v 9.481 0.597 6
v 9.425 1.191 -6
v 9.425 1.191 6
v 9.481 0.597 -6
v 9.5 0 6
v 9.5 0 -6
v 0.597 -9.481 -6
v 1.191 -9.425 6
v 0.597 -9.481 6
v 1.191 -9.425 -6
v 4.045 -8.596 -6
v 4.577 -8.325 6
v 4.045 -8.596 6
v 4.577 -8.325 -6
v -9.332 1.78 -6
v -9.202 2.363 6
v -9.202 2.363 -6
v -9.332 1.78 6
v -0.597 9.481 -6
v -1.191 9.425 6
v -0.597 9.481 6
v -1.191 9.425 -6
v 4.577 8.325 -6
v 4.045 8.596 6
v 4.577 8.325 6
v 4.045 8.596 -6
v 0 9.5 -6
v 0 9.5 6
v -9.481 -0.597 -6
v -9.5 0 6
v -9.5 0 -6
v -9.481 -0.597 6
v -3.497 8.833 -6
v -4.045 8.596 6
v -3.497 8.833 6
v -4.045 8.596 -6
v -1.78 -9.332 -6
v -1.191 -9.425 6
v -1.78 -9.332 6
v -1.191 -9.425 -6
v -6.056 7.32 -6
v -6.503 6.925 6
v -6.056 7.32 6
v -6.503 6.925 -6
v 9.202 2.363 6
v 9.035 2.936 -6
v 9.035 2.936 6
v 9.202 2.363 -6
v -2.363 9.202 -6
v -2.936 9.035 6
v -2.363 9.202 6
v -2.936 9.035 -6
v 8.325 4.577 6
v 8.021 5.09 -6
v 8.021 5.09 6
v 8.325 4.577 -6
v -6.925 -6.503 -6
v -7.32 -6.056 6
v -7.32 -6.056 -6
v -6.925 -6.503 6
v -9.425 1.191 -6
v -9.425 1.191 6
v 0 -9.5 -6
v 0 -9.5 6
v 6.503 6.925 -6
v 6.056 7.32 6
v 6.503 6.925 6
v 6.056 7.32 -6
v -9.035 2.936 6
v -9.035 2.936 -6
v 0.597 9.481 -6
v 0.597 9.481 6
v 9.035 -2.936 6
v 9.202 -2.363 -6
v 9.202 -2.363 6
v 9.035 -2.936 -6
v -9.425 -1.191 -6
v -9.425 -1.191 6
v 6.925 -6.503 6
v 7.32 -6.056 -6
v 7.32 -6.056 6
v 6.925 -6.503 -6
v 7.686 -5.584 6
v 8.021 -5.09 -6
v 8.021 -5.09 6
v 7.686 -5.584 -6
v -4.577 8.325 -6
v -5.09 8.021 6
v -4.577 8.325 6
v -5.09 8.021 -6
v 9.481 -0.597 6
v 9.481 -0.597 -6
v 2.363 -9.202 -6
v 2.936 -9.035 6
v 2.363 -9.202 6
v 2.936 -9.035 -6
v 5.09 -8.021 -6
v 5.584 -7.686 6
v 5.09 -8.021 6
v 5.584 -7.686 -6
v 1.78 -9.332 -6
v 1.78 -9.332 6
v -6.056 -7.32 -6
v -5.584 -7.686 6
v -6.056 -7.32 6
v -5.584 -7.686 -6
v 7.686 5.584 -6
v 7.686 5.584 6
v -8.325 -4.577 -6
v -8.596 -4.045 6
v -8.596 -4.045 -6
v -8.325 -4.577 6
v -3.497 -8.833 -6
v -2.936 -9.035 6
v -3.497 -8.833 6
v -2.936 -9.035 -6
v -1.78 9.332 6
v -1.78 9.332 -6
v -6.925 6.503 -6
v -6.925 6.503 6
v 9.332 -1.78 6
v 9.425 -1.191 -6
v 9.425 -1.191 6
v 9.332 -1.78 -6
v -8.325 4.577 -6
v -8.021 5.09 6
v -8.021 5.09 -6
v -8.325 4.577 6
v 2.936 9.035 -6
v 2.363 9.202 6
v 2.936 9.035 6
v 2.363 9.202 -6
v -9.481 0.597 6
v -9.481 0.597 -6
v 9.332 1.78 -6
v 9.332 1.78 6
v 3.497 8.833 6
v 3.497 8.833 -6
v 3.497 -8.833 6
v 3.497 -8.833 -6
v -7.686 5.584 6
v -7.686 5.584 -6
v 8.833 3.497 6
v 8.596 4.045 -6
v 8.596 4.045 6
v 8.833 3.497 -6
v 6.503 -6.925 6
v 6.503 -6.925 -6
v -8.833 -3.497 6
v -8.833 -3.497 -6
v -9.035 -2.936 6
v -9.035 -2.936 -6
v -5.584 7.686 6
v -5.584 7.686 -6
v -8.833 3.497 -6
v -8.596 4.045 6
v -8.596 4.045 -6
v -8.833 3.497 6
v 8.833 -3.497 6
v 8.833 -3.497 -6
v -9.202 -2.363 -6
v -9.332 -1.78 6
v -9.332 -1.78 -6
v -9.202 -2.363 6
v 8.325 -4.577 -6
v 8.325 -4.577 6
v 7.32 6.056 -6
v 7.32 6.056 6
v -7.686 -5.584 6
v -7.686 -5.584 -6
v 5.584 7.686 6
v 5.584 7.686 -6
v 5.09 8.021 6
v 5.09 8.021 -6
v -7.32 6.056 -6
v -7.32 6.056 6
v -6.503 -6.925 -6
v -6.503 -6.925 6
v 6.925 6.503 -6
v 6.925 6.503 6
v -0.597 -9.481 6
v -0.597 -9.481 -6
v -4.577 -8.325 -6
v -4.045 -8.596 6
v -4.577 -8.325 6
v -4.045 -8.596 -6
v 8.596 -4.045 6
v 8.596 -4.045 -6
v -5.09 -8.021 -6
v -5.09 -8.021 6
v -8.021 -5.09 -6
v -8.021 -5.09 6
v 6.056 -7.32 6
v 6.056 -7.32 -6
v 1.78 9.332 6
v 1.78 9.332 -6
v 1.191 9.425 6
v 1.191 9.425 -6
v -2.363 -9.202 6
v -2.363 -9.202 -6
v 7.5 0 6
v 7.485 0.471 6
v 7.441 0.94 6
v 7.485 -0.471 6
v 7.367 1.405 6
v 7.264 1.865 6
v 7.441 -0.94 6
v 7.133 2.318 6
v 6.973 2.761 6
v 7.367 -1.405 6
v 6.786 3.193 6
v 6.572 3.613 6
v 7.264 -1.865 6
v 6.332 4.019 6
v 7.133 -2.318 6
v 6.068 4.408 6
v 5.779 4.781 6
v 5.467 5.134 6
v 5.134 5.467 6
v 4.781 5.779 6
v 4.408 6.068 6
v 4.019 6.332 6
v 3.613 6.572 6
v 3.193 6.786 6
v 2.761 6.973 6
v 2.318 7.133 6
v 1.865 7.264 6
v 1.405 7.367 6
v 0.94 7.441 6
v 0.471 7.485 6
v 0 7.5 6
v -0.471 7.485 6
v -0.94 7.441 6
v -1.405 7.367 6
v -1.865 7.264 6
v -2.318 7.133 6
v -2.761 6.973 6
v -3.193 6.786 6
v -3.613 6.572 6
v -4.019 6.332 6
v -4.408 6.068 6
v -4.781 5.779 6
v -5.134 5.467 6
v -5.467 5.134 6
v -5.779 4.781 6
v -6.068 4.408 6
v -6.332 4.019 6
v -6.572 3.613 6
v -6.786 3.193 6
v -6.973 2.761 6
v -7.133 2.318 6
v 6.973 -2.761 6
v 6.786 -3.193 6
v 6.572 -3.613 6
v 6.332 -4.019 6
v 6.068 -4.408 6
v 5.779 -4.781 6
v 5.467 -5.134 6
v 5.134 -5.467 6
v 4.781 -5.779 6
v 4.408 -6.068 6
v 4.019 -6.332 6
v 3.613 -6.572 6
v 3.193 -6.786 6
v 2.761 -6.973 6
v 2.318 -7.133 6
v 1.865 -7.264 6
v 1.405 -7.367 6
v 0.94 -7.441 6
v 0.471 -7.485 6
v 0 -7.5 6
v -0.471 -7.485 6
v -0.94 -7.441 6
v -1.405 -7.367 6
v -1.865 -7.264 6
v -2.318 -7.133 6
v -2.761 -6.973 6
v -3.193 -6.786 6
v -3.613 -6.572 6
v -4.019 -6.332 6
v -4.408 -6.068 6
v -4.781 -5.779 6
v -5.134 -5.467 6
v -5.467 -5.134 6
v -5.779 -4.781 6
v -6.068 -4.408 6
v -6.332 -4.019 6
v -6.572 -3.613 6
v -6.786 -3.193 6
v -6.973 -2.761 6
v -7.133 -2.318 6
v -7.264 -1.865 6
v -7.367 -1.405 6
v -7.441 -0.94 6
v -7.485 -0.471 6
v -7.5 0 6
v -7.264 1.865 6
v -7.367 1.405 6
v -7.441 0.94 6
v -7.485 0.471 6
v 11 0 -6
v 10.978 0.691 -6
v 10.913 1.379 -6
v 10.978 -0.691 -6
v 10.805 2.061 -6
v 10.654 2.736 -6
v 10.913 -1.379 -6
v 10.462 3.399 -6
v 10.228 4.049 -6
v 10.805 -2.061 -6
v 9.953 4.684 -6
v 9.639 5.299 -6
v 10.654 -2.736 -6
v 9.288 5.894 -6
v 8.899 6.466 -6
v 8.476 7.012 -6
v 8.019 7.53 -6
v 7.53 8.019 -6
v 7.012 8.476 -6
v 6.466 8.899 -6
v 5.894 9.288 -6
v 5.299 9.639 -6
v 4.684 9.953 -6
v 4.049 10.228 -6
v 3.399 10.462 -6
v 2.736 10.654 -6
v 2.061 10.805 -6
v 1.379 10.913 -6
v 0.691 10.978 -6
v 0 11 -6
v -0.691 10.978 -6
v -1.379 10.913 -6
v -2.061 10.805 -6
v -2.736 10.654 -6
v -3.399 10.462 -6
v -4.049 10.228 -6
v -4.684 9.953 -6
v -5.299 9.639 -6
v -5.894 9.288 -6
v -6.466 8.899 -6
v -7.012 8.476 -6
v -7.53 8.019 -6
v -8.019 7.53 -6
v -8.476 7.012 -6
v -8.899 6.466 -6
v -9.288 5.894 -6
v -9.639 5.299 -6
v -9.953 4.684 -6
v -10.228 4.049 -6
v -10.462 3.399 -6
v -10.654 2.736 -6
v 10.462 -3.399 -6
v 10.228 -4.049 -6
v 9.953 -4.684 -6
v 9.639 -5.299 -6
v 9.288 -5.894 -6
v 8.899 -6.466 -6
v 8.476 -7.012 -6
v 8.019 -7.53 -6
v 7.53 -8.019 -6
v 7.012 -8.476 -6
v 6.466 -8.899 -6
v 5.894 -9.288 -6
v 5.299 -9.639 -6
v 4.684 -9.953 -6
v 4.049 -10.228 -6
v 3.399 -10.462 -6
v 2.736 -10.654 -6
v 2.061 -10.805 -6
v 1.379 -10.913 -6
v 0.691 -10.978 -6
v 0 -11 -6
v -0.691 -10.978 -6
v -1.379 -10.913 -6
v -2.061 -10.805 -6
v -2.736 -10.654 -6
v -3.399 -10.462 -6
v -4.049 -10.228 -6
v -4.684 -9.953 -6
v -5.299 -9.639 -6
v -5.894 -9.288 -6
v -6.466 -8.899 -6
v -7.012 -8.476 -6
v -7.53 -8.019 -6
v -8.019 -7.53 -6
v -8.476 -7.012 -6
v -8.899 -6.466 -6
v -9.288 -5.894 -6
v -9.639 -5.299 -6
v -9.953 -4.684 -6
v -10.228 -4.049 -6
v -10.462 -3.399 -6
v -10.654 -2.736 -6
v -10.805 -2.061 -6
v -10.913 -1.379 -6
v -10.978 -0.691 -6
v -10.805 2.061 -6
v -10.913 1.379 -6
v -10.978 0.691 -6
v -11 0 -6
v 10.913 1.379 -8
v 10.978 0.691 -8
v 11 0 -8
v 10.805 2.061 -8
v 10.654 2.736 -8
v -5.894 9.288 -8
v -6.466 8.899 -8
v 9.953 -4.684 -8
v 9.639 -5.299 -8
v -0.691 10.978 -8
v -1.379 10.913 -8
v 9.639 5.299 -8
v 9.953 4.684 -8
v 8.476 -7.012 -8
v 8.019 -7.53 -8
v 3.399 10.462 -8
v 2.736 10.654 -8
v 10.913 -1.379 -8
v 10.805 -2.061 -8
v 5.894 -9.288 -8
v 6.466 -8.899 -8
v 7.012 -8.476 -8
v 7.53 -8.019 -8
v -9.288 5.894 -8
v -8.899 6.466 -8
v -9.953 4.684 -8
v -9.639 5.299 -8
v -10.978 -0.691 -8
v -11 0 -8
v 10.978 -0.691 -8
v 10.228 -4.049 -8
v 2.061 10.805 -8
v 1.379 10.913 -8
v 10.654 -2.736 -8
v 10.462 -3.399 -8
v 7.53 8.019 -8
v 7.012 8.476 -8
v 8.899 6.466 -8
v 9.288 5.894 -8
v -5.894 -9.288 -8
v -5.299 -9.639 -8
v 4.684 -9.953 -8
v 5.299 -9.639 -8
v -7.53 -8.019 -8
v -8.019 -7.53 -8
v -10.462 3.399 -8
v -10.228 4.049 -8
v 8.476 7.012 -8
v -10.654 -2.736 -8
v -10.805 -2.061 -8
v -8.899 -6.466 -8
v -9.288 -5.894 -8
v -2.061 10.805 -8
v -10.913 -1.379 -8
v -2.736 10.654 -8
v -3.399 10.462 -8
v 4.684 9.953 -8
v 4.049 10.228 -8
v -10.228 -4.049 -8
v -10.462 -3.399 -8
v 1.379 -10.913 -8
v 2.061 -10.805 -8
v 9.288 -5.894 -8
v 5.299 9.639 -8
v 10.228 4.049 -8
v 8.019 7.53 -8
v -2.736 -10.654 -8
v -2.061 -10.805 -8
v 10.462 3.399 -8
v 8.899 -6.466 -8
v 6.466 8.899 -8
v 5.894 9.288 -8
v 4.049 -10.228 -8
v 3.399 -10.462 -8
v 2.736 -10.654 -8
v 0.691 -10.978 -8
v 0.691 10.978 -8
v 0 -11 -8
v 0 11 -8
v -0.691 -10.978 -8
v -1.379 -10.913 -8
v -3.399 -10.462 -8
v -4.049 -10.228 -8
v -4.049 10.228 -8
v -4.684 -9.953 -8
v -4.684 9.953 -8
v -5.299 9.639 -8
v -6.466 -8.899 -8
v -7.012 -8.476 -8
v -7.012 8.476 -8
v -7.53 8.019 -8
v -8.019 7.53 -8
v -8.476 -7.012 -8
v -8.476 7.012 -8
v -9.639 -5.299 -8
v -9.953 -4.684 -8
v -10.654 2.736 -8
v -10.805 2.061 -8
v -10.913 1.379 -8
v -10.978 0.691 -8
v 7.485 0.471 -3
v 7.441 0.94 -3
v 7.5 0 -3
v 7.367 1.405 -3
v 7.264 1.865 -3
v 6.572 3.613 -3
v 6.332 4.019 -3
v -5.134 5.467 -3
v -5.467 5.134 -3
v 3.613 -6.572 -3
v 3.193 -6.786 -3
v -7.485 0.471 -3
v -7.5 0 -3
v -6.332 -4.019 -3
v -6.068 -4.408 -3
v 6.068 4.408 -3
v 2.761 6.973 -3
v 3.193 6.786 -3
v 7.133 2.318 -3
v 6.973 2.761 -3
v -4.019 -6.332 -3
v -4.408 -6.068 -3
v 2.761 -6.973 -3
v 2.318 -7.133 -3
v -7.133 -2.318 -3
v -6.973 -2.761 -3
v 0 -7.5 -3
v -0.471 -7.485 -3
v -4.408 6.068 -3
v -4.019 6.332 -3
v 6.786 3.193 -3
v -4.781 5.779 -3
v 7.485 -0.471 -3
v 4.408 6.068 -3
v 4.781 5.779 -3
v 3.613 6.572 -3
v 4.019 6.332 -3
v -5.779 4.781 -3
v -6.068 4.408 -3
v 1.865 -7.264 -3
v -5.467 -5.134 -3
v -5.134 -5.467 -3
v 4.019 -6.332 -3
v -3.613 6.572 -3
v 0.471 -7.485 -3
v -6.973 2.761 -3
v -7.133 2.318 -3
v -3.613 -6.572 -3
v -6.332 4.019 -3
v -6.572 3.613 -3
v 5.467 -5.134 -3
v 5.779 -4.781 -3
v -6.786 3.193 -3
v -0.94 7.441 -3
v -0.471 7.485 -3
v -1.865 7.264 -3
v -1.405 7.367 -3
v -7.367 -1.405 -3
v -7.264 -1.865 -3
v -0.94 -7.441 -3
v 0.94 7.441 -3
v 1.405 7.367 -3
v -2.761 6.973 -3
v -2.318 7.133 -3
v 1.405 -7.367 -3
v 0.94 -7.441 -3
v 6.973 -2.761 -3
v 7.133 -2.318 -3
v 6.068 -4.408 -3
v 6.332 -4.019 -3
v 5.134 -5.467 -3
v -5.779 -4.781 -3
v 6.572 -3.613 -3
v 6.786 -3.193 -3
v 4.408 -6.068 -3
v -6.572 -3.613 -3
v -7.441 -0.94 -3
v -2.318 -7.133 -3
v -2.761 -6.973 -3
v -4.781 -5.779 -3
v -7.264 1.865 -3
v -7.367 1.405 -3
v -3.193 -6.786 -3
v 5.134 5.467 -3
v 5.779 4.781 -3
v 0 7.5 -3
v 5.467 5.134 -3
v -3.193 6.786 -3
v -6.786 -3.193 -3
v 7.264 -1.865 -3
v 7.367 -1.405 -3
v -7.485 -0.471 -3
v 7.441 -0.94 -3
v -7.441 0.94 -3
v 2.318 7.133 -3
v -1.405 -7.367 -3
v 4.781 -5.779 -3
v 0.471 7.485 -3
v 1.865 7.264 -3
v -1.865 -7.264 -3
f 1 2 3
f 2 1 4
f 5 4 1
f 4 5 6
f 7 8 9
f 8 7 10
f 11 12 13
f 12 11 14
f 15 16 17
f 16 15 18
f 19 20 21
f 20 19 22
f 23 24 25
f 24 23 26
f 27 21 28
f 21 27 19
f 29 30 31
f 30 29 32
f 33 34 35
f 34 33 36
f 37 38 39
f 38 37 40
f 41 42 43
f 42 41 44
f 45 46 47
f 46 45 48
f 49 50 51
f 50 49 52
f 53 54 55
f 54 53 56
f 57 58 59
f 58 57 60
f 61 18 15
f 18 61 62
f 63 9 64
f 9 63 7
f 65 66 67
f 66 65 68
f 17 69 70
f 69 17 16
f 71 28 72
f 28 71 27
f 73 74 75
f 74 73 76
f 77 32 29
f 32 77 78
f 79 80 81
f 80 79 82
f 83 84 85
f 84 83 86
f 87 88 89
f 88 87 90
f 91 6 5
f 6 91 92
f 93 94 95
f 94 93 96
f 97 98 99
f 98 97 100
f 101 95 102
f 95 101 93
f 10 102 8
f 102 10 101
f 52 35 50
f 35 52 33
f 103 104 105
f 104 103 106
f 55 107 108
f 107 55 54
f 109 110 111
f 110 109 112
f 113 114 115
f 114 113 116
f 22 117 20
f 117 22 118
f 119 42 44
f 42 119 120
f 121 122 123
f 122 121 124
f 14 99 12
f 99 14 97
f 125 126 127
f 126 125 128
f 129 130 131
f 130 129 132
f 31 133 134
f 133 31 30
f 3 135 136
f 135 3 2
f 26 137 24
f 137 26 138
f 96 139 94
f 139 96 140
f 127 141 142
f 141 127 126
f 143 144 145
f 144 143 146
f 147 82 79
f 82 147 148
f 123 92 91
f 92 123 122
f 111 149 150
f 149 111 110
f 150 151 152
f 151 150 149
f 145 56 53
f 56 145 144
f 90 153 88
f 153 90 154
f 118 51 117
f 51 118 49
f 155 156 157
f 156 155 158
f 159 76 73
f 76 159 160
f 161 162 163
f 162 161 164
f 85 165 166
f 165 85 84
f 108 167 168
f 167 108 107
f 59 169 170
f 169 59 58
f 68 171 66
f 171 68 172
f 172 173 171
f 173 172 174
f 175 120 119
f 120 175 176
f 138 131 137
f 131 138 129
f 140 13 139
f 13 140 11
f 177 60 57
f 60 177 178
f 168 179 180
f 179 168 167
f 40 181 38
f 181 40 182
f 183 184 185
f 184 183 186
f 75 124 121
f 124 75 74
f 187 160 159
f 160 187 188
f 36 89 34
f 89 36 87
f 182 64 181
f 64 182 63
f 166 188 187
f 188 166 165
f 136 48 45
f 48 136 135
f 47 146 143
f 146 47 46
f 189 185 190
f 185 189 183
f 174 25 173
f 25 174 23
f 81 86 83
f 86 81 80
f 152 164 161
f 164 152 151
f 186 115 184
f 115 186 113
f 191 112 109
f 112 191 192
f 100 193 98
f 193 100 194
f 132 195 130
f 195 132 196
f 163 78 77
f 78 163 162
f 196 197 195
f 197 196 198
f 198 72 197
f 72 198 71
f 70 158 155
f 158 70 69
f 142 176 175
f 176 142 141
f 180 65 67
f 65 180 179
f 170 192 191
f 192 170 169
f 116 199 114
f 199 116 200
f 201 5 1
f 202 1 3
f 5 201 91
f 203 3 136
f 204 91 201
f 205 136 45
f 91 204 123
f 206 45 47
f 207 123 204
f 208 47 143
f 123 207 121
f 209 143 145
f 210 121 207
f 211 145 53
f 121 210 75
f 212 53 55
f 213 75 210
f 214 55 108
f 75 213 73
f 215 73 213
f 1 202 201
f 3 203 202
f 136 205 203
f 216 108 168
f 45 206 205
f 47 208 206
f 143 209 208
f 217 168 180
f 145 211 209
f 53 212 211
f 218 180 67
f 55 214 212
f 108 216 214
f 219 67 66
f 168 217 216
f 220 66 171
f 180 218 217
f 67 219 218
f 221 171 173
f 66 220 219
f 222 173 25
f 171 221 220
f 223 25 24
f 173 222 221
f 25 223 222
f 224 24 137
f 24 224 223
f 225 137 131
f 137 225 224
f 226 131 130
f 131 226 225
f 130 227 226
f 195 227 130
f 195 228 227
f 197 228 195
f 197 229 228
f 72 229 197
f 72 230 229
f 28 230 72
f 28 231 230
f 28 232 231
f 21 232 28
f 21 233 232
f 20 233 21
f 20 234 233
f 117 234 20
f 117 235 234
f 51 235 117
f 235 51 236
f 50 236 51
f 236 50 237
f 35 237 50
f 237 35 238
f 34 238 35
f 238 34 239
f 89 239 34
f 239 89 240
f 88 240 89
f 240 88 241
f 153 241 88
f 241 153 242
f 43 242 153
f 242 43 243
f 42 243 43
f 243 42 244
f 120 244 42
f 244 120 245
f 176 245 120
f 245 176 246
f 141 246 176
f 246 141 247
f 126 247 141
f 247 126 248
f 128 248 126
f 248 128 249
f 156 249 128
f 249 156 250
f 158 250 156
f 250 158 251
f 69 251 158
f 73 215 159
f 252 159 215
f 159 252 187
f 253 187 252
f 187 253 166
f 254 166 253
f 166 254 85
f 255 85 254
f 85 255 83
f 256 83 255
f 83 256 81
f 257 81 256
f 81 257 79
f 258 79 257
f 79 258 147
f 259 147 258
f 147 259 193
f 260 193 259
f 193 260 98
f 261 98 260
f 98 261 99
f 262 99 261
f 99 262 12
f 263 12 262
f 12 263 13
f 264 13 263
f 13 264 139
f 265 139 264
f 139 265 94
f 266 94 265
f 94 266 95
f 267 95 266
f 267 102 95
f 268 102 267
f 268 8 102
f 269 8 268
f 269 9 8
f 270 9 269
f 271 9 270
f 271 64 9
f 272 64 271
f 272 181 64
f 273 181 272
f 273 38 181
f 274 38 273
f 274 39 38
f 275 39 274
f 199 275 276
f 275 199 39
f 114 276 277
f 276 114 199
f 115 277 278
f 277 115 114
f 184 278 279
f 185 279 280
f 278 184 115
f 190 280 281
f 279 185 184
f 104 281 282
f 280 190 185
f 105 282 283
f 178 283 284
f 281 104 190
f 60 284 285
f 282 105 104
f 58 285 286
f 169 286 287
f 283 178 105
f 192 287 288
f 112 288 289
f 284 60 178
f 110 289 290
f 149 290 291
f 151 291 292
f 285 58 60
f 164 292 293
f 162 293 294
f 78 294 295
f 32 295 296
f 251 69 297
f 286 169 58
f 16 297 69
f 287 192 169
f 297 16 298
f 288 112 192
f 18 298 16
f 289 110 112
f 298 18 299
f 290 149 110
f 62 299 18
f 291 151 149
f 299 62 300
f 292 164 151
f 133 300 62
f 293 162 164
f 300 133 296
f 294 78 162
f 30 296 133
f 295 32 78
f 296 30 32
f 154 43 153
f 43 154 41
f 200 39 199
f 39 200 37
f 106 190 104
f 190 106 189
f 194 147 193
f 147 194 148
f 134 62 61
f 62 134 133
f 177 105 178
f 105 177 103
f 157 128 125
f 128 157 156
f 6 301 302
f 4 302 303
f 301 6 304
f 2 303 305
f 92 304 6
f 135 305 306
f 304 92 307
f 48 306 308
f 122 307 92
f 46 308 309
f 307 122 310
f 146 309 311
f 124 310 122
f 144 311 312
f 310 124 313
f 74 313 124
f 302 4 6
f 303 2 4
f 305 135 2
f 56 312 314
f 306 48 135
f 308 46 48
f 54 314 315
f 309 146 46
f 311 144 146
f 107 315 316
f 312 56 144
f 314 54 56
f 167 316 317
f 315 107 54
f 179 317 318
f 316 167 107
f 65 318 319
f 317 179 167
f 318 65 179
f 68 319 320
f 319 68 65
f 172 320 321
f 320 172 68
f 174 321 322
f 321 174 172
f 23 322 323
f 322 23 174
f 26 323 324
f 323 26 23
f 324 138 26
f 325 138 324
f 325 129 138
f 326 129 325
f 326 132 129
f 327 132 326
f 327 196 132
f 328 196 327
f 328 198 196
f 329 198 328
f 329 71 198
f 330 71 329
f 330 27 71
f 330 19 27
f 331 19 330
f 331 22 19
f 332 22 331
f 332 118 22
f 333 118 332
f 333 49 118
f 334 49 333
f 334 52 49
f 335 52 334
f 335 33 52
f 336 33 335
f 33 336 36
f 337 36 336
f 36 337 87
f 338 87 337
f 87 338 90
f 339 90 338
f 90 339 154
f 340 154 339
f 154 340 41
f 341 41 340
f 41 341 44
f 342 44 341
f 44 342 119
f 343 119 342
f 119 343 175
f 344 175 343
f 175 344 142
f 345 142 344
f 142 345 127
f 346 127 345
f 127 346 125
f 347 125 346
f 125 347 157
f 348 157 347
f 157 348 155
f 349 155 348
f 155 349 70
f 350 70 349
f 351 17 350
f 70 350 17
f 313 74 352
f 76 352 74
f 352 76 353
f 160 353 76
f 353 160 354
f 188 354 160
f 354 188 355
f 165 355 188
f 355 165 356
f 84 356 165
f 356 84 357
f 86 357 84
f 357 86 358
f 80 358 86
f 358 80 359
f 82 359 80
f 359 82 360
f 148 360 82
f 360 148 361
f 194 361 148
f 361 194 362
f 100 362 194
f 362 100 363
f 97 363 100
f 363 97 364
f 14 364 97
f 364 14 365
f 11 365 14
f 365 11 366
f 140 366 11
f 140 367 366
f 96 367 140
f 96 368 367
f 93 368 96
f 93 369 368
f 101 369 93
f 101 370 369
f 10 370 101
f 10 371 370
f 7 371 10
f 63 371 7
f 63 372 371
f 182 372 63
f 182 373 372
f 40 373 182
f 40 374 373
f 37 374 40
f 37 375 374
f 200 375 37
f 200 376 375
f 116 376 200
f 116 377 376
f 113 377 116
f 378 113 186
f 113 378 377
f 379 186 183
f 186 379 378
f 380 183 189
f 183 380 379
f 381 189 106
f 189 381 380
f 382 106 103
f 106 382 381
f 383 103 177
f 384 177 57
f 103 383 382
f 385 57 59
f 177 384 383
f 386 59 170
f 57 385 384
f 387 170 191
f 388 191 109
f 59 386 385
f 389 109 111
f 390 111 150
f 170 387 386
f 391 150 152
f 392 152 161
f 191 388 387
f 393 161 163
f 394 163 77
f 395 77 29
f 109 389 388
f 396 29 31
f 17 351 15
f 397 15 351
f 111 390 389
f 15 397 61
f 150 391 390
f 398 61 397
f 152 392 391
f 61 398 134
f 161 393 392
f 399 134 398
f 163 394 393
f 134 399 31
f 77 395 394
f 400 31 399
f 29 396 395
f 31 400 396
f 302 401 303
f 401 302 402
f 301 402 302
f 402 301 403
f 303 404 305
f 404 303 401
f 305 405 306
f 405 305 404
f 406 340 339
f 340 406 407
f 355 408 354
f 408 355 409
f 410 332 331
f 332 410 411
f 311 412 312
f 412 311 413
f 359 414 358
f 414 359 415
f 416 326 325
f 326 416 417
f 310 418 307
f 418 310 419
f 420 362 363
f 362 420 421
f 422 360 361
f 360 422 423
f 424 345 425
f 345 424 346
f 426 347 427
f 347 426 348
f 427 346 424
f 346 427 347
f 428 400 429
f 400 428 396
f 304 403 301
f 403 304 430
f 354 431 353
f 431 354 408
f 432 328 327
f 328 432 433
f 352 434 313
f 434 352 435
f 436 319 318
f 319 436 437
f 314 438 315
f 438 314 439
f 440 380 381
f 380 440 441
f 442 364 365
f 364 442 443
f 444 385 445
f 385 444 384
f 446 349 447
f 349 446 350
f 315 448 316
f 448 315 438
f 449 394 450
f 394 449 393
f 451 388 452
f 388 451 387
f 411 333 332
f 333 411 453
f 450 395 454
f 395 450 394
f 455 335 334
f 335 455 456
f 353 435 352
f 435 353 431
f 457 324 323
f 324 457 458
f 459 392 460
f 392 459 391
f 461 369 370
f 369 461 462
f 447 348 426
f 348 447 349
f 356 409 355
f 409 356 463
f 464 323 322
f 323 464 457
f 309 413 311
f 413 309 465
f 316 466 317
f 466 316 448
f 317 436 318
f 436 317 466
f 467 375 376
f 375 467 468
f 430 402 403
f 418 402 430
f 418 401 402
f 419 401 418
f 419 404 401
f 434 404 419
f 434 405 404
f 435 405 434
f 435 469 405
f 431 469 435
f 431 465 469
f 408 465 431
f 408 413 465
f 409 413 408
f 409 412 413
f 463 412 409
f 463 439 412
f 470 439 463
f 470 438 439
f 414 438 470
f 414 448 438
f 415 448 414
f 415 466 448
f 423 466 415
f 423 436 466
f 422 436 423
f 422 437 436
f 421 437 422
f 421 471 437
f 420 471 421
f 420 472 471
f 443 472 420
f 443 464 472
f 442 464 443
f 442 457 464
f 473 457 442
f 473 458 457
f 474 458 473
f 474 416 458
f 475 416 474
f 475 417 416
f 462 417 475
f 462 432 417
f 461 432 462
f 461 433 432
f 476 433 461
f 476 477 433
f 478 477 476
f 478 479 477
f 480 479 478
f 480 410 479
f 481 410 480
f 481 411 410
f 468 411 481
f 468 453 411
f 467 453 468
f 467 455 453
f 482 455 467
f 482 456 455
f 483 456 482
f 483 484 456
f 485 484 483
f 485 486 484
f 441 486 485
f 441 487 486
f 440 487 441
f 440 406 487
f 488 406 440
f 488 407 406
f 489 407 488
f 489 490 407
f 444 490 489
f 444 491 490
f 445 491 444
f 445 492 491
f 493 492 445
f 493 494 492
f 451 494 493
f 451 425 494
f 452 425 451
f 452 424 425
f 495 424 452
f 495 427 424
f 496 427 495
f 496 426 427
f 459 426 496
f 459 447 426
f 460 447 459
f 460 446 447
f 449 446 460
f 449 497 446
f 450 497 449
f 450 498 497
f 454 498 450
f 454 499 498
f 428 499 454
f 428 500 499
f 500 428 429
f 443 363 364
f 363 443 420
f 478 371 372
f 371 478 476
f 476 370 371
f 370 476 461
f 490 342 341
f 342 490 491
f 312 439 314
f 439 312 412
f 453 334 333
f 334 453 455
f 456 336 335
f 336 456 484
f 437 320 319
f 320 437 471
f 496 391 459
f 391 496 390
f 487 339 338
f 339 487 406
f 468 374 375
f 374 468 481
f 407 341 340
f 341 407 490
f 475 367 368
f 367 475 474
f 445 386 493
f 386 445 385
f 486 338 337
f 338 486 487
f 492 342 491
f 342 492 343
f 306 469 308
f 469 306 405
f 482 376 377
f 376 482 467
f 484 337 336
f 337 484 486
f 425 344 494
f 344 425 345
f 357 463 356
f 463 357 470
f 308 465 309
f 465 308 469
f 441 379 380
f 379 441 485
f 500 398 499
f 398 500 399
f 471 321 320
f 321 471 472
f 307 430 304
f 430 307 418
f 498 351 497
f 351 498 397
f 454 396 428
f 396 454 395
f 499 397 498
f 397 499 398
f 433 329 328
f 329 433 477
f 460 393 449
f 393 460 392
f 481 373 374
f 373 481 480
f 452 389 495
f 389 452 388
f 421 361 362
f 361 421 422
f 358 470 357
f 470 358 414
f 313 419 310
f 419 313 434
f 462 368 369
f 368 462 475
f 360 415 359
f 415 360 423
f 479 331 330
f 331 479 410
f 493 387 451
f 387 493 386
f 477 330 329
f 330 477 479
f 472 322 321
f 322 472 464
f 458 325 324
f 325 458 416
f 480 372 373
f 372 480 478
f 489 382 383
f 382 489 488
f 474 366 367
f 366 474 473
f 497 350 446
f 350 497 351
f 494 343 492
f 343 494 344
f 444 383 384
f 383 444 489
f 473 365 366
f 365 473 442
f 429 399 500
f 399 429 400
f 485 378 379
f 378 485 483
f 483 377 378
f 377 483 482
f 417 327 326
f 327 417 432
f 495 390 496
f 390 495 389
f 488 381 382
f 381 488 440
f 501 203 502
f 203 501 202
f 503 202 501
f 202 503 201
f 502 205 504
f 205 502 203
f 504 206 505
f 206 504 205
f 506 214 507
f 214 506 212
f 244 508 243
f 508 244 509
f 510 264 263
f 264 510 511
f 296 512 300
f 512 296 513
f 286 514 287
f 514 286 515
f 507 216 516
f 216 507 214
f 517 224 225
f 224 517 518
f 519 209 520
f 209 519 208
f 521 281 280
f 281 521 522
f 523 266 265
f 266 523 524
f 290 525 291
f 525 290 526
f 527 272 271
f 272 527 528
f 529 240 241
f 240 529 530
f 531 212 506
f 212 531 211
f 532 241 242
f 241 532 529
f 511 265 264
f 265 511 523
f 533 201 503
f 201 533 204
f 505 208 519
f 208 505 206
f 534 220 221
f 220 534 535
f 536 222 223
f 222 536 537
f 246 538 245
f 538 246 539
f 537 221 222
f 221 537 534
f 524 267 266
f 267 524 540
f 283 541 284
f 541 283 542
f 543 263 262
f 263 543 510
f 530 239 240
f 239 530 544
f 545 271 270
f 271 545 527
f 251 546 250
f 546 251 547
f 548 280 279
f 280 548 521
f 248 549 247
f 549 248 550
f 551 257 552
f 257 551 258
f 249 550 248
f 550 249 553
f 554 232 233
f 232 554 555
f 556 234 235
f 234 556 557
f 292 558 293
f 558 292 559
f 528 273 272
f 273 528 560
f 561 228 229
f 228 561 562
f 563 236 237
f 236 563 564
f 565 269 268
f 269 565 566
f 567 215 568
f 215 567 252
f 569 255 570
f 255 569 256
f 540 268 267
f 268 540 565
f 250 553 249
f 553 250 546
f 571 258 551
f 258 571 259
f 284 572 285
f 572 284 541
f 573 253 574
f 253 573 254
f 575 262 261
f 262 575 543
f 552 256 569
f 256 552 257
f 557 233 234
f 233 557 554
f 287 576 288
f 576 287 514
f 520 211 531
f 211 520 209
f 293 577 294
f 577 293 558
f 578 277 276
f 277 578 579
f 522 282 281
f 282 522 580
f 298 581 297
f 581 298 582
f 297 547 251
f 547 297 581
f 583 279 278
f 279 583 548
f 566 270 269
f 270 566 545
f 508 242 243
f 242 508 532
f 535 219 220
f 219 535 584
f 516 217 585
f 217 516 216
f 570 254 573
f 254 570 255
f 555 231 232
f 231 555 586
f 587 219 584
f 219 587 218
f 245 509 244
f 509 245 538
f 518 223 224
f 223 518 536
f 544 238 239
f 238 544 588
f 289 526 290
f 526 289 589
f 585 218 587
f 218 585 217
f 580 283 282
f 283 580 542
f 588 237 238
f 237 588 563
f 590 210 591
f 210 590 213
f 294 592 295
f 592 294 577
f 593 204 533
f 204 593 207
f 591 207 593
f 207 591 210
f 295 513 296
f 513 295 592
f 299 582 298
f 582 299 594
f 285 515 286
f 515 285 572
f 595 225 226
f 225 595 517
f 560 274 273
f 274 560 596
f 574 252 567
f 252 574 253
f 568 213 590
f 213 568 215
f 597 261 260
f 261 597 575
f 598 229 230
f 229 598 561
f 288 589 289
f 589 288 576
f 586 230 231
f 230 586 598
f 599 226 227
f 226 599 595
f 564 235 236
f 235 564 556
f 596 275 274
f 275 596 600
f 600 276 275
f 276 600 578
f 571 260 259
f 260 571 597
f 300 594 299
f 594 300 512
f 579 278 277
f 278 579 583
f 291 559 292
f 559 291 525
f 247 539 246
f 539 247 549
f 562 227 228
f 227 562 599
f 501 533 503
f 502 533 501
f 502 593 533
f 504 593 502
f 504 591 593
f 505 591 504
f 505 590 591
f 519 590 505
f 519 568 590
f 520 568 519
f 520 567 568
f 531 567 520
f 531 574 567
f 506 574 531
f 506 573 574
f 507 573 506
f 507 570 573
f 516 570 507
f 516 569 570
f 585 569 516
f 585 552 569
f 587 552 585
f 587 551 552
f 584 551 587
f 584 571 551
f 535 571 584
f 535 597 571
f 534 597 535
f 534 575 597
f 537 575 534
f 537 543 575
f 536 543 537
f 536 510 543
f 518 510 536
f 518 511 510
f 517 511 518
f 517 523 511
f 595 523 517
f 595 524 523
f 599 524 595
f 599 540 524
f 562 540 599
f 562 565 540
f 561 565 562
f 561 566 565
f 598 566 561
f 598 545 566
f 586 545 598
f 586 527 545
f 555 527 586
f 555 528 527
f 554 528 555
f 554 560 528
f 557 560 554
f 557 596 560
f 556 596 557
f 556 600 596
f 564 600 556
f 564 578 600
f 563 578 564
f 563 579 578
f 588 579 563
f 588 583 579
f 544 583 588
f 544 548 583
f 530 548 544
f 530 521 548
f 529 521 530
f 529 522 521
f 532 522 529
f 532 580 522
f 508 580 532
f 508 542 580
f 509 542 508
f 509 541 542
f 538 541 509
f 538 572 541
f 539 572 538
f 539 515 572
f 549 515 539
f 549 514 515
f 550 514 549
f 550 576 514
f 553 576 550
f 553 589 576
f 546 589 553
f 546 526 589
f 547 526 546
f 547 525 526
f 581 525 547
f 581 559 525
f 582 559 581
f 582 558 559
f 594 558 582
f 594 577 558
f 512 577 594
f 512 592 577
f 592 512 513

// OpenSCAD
$fn=100;

id=19;
od=22;
wide=4/2;
height=12;
difference(){
    union(){
        cylinder(h = height, r=id/2, center = true);
        translate([0,0,-height/2-wide/2]) cylinder(h = wide, r=od/2, center = true);
    }
    translate([0,0,wide]) cylinder(h = height-wide, r=(id/2)-2, center = true);
}
